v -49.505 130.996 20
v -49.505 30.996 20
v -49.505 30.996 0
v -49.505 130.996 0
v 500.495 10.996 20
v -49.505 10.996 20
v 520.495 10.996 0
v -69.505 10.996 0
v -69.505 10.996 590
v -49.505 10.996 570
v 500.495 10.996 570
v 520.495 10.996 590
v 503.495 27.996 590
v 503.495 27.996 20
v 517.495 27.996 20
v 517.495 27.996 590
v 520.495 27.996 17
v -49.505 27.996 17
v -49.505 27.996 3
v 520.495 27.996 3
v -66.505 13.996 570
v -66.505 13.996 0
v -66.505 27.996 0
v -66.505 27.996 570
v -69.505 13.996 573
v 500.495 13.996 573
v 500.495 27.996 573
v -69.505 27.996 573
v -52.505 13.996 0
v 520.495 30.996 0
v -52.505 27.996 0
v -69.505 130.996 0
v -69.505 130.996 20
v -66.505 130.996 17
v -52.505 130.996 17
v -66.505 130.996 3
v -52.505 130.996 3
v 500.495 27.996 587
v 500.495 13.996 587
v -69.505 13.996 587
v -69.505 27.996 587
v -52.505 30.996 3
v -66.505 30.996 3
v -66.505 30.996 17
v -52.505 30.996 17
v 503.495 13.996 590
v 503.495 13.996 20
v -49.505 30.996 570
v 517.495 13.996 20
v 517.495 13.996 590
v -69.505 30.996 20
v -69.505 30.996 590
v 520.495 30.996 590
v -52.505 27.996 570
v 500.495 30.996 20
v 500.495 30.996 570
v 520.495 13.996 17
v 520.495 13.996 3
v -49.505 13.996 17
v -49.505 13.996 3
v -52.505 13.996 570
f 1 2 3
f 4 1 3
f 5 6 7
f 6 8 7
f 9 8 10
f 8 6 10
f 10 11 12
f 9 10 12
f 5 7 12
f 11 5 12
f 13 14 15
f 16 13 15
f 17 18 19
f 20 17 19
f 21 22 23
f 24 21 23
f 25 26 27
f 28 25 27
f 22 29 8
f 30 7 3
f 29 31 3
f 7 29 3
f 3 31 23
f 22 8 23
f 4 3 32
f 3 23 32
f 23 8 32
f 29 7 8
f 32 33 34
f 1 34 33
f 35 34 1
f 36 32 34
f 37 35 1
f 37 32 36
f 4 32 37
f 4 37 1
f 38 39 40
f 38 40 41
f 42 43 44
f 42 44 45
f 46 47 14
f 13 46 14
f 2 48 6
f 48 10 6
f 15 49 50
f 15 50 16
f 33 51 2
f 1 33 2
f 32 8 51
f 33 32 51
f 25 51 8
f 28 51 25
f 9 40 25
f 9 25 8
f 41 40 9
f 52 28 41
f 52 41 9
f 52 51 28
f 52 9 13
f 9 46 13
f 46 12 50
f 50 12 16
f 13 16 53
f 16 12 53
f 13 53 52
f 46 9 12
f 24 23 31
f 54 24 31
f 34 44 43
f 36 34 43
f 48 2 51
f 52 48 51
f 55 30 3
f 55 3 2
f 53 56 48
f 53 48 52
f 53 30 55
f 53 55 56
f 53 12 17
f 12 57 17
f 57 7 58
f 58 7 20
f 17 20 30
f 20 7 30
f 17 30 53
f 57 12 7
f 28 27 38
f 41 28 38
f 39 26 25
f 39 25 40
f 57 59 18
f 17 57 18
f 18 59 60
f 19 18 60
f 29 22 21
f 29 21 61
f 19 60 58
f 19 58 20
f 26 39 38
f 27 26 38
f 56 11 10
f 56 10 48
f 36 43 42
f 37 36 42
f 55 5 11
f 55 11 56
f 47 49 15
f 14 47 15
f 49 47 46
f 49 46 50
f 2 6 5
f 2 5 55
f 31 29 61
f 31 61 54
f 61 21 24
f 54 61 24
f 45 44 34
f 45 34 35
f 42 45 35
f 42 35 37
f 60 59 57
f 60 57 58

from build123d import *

# Parameters (mm, degrees)
SKETCH_1_W      = 20
SKETCH_1_H      = 20
SKETCH_1_W_2    = 14
SKETCH_1_H_2    = 14
EXTRUDE_1_DEPTH = 570
SKETCH_2_W      = 20
SKETCH_2_H      = 20
SKETCH_2_W_2    = 14
SKETCH_2_H_2    = 14
EXTRUDE_2_DEPTH = 100
SKETCH_5_W      = 20
SKETCH_5_H      = 20
SKETCH_5_W_2    = 14
SKETCH_5_H_2    = 14
EXTRUDE_3_DEPTH = 570
SKETCH_6_W      = 20
SKETCH_6_H      = 20
SKETCH_6_W_2    = 14
SKETCH_6_H_2    = 14
EXTRUDE_4_DEPTH = 570
SKETCH_7_W      = 20
SKETCH_7_H      = 20
SKETCH_7_W_2    = 14
SKETCH_7_H_2    = 14
EXTRUDE_5_DEPTH = 570


with BuildPart() as part:
    # 草图1 → 凸台-拉伸1 (new body)
    with BuildSketch(Plane.XY):
        with Locations((-59.504950495, 20.995577113)):
            Rectangle(SKETCH_1_W, SKETCH_1_H)
        with Locations((-59.504950495, 20.995577113)):
            Rectangle(SKETCH_1_W_2, SKETCH_1_H_2, mode=Mode.SUBTRACT)
    extrude(amount=EXTRUDE_1_DEPTH)

    # 草图2 → 凸台-拉伸2 (add)
    with BuildSketch(Plane(origin=(0, 30.995577113, 0), x_dir=(1, 0, 0), z_dir=(0, 1, 0))):
        with Locations((-59.504950495, -10)):
            Rectangle(SKETCH_2_W, SKETCH_2_H)
        with Locations((-59.504950495, -10)):
            Rectangle(SKETCH_2_W_2, SKETCH_2_H_2, mode=Mode.SUBTRACT)
    extrude(amount=EXTRUDE_2_DEPTH)

    # 草图5 → 凸台-拉伸3 (add)
    with BuildSketch(Plane(origin=(-49.504950495, 0, 0), x_dir=(0, 0, -1), z_dir=(1, 0, 0))):
        with Locations((-10, 20.995577113)):
            Rectangle(SKETCH_5_W, SKETCH_5_H)
        with Locations((-10, 20.995577113)):
            Rectangle(SKETCH_5_W_2, SKETCH_5_H_2, mode=Mode.SUBTRACT)
    extrude(amount=EXTRUDE_3_DEPTH)

    # 草图6 → 凸台-拉伸4 (add)
    with BuildSketch(Plane.XY.offset(20)):
        with Locations((510.495049505, 20.995577113)):
            Rectangle(SKETCH_6_W, SKETCH_6_H)
        with Locations((510.495049505, 20.995577113)):
            Rectangle(SKETCH_6_W_2, SKETCH_6_H_2, mode=Mode.SUBTRACT)
    extrude(amount=EXTRUDE_4_DEPTH)

    # 草图7 → 凸台-拉伸5 (add)
    with BuildSketch(Plane.ZY.offset(-500.495049505)):
        with Locations((580, 20.995577113)):
            Rectangle(SKETCH_7_W, SKETCH_7_H)
        with Locations((580, 20.995577113)):
            Rectangle(SKETCH_7_W_2, SKETCH_7_H_2, mode=Mode.SUBTRACT)
    extrude(amount=EXTRUDE_5_DEPTH)


solid = part.part
